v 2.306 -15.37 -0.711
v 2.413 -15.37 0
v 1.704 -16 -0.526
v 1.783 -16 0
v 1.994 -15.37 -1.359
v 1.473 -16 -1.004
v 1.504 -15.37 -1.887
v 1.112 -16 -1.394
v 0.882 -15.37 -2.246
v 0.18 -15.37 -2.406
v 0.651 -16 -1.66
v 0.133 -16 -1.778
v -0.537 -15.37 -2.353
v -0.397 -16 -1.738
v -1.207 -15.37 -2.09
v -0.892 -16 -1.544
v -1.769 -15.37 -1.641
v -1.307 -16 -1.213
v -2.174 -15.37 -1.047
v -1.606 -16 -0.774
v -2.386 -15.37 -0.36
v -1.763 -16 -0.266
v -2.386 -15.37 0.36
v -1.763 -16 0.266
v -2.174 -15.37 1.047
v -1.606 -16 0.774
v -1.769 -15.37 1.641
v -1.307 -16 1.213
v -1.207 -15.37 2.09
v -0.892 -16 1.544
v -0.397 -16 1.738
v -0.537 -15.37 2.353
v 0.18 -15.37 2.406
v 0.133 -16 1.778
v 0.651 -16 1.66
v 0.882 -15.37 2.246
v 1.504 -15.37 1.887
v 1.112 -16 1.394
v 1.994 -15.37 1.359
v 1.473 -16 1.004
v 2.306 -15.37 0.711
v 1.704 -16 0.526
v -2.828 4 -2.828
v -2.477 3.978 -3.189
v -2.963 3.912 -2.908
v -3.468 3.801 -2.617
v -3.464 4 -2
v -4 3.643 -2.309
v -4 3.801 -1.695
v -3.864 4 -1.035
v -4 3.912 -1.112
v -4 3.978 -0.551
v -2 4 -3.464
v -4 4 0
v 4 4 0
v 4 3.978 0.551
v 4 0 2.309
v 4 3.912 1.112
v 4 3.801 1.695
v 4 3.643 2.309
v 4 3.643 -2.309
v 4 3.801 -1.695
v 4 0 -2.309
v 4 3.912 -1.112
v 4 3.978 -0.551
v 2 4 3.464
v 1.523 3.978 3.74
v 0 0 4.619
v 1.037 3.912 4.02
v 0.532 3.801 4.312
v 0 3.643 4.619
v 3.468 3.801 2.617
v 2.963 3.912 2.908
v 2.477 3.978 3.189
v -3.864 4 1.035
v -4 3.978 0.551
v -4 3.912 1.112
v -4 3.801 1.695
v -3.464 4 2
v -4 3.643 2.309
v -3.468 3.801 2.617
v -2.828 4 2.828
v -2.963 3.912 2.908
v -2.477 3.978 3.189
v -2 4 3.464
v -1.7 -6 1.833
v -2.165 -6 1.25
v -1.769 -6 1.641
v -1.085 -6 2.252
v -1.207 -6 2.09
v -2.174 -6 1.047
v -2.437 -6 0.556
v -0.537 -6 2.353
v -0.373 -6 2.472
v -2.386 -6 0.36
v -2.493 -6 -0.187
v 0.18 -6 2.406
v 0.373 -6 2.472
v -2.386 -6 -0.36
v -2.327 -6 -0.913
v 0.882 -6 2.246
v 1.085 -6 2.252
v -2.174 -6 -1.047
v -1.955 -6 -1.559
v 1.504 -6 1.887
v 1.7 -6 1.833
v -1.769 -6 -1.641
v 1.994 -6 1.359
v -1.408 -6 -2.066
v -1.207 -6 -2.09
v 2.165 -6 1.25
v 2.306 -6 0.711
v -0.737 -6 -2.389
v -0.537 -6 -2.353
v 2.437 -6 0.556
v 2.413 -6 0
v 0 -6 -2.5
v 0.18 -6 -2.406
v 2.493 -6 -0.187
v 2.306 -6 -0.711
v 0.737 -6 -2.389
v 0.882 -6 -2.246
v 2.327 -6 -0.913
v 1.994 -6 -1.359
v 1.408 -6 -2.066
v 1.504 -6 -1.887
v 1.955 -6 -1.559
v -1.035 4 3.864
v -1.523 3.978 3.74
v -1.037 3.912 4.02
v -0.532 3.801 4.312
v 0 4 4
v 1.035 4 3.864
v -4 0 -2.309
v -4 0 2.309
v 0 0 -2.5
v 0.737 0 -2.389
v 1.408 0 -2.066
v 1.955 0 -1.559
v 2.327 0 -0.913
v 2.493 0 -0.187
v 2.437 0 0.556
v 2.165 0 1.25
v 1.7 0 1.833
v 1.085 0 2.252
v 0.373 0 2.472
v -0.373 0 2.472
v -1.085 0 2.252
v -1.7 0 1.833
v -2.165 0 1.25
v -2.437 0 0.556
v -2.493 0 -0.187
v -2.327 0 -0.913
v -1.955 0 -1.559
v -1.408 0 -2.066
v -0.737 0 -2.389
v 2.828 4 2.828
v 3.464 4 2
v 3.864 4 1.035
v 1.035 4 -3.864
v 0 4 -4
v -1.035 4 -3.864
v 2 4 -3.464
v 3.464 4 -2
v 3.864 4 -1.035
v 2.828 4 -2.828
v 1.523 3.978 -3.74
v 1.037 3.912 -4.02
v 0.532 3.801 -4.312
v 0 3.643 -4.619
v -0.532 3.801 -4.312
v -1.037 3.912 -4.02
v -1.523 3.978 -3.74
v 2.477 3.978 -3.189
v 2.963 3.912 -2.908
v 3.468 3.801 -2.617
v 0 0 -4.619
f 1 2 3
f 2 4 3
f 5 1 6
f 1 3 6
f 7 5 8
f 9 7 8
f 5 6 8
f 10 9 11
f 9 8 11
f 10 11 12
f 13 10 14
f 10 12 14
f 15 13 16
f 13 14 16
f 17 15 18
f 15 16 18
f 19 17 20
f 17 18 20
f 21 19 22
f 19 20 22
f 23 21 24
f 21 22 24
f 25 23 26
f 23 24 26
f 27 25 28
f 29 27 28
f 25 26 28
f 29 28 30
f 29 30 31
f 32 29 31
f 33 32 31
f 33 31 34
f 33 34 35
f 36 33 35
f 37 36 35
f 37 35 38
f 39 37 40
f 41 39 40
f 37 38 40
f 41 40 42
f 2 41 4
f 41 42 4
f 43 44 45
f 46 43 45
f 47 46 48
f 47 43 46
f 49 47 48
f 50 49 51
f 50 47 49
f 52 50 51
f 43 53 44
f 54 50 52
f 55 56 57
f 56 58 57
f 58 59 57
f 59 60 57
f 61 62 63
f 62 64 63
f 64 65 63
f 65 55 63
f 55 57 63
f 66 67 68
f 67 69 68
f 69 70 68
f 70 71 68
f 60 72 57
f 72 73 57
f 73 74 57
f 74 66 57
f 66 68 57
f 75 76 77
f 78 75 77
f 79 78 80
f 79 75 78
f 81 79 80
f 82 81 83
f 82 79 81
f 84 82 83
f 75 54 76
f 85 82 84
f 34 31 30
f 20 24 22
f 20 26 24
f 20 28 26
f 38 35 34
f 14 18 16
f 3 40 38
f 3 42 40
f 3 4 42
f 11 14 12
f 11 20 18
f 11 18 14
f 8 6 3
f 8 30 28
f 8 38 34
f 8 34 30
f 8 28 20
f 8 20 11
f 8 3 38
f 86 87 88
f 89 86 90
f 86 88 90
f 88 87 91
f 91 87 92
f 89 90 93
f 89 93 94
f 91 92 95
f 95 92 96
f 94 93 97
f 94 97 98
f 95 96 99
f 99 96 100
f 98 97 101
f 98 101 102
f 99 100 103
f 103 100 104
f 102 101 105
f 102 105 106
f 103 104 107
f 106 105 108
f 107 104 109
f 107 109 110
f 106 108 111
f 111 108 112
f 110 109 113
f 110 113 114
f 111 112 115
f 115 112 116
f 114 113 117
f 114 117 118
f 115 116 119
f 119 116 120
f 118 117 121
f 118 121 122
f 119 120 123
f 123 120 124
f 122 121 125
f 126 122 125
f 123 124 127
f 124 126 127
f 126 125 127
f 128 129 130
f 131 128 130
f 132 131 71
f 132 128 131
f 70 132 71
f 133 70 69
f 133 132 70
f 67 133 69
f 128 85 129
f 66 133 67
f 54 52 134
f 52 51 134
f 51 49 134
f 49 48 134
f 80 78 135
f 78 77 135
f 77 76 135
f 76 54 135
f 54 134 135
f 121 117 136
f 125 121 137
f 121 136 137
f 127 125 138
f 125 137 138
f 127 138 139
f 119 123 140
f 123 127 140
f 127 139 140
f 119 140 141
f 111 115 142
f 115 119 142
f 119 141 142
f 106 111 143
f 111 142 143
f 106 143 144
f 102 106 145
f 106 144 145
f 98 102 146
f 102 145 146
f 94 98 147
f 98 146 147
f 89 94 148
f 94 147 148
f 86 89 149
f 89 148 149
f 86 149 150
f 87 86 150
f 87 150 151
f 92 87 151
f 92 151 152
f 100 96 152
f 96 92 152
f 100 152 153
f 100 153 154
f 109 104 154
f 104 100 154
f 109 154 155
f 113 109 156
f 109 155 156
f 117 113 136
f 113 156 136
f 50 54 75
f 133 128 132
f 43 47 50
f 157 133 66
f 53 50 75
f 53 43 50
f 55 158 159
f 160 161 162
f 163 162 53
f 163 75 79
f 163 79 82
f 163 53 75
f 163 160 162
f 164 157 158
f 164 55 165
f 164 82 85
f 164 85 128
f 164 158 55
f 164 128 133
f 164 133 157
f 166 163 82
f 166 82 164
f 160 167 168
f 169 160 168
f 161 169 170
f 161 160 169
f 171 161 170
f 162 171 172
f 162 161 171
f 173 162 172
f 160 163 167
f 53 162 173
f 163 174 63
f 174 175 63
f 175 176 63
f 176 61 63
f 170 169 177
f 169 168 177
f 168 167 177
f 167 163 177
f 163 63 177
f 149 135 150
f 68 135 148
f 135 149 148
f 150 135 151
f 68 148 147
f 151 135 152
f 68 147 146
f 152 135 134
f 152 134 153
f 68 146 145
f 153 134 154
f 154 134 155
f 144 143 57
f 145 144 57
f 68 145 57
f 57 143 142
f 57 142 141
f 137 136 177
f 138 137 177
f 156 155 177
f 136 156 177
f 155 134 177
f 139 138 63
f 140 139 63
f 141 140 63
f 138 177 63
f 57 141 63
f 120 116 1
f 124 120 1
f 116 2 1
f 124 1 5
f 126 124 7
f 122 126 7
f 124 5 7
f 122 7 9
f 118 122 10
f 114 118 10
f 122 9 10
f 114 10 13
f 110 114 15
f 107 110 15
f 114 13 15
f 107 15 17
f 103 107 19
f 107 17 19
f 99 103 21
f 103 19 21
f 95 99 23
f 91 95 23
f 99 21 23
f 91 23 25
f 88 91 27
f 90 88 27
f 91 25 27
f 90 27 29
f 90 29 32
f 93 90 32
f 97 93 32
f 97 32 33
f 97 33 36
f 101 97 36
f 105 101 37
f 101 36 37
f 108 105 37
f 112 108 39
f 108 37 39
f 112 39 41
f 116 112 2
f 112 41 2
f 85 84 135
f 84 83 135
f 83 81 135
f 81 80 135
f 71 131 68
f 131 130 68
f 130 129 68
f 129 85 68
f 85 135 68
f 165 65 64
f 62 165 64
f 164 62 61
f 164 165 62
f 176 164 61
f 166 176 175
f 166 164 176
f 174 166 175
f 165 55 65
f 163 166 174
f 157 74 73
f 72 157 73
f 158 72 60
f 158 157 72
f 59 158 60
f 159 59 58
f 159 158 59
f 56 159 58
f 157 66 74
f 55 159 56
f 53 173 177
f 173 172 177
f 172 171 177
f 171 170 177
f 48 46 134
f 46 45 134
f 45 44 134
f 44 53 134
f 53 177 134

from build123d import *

# Parameters (mm, degrees)
EXTRUDE_1_DEPTH     = 4
SKETCH_2_R          = 2.5
EXTRUDE_2_DEPTH     = 16
SKETCH_3_OUTSIDE_W  = 70.114
SKETCH_3_OUTSIDE_H  = 71.352
SKETCH_3_OUTSIDE_R  = 4
CUT_EXTRUDE_1_DEPTH = 16
CUT_EXTRUDE_1_DRAFT = -60


# Read off the part's stored shape, not the designer's step: #10-24 机械螺纹 螺柱4
with BuildPart() as part:
    # 草图1 → 凸台-拉伸1 (new body)
    with BuildSketch(Plane(origin=(0, 0, 0), x_dir=(1, 0, 0), z_dir=(0, 1, 0))):
        Polygon((4, -2.309401077), (4, 2.309401077), (0, 4.618802154), (-4, 2.309401077), (-4, -2.309401077), (0, -4.618802154), align=None)
    extrude(amount=EXTRUDE_1_DEPTH)

    # 草图2 → 凸台-拉伸2 (add)
    with BuildSketch(Plane.XZ):
        with Locations(Location((0, 0, 0), (0, 0, 270))):
            Circle(SKETCH_2_R)
    extrude(amount=EXTRUDE_2_DEPTH)


with BuildPart() as cut_extrude_1_tool:
    # 草图3 outside → 切除-拉伸1 (with draft: the straight prism first)
    with BuildSketch(Plane(origin=(0, 4, 0), x_dir=(1, 0, 0), z_dir=(0, 1, 0))):
        Rectangle(SKETCH_3_OUTSIDE_W, SKETCH_3_OUTSIDE_H)
        Circle(SKETCH_3_OUTSIDE_R, mode=Mode.SUBTRACT)
    extrude(amount=-CUT_EXTRUDE_1_DEPTH)
    # 切除-拉伸1: the draft: its side faces are tilted about the plane it starts from
    cut_extrude_1_sides = [cut_extrude_1_tool.faces().sort_by_distance(p)[0] for p in [
        (0, -4, 35.676),
        (35.057, -4, 0),
        (0, -4, -35.676),
        (-35.057, -4, 0),
        (-4, -4, 0),
    ]]
    draft(cut_extrude_1_sides, Plane(origin=(0, 4, 0), x_dir=(1, 0, 0), z_dir=(0, 1, 0)), CUT_EXTRUDE_1_DRAFT)


with BuildPart() as part_1:
    add(part.part)

    # 切除-拉伸1: cut by cut_extrude_1_tool
    add(cut_extrude_1_tool.part, mode=Mode.SUBTRACT)

    # #10-24 机械螺纹 螺柱4 outline → #10-24 机械螺纹 螺柱4 (revolve, cut)
    with BuildSketch(Plane.XY):
        Polygon((1.78308, -16), (2.5, -16), (2.5, -6), (2.413, -6), (2.413, -15.37008), align=None)
    revolve(axis=Axis((0, 0, 0), (0, 1, 0)), mode=Mode.SUBTRACT)


solid = part_1.part
